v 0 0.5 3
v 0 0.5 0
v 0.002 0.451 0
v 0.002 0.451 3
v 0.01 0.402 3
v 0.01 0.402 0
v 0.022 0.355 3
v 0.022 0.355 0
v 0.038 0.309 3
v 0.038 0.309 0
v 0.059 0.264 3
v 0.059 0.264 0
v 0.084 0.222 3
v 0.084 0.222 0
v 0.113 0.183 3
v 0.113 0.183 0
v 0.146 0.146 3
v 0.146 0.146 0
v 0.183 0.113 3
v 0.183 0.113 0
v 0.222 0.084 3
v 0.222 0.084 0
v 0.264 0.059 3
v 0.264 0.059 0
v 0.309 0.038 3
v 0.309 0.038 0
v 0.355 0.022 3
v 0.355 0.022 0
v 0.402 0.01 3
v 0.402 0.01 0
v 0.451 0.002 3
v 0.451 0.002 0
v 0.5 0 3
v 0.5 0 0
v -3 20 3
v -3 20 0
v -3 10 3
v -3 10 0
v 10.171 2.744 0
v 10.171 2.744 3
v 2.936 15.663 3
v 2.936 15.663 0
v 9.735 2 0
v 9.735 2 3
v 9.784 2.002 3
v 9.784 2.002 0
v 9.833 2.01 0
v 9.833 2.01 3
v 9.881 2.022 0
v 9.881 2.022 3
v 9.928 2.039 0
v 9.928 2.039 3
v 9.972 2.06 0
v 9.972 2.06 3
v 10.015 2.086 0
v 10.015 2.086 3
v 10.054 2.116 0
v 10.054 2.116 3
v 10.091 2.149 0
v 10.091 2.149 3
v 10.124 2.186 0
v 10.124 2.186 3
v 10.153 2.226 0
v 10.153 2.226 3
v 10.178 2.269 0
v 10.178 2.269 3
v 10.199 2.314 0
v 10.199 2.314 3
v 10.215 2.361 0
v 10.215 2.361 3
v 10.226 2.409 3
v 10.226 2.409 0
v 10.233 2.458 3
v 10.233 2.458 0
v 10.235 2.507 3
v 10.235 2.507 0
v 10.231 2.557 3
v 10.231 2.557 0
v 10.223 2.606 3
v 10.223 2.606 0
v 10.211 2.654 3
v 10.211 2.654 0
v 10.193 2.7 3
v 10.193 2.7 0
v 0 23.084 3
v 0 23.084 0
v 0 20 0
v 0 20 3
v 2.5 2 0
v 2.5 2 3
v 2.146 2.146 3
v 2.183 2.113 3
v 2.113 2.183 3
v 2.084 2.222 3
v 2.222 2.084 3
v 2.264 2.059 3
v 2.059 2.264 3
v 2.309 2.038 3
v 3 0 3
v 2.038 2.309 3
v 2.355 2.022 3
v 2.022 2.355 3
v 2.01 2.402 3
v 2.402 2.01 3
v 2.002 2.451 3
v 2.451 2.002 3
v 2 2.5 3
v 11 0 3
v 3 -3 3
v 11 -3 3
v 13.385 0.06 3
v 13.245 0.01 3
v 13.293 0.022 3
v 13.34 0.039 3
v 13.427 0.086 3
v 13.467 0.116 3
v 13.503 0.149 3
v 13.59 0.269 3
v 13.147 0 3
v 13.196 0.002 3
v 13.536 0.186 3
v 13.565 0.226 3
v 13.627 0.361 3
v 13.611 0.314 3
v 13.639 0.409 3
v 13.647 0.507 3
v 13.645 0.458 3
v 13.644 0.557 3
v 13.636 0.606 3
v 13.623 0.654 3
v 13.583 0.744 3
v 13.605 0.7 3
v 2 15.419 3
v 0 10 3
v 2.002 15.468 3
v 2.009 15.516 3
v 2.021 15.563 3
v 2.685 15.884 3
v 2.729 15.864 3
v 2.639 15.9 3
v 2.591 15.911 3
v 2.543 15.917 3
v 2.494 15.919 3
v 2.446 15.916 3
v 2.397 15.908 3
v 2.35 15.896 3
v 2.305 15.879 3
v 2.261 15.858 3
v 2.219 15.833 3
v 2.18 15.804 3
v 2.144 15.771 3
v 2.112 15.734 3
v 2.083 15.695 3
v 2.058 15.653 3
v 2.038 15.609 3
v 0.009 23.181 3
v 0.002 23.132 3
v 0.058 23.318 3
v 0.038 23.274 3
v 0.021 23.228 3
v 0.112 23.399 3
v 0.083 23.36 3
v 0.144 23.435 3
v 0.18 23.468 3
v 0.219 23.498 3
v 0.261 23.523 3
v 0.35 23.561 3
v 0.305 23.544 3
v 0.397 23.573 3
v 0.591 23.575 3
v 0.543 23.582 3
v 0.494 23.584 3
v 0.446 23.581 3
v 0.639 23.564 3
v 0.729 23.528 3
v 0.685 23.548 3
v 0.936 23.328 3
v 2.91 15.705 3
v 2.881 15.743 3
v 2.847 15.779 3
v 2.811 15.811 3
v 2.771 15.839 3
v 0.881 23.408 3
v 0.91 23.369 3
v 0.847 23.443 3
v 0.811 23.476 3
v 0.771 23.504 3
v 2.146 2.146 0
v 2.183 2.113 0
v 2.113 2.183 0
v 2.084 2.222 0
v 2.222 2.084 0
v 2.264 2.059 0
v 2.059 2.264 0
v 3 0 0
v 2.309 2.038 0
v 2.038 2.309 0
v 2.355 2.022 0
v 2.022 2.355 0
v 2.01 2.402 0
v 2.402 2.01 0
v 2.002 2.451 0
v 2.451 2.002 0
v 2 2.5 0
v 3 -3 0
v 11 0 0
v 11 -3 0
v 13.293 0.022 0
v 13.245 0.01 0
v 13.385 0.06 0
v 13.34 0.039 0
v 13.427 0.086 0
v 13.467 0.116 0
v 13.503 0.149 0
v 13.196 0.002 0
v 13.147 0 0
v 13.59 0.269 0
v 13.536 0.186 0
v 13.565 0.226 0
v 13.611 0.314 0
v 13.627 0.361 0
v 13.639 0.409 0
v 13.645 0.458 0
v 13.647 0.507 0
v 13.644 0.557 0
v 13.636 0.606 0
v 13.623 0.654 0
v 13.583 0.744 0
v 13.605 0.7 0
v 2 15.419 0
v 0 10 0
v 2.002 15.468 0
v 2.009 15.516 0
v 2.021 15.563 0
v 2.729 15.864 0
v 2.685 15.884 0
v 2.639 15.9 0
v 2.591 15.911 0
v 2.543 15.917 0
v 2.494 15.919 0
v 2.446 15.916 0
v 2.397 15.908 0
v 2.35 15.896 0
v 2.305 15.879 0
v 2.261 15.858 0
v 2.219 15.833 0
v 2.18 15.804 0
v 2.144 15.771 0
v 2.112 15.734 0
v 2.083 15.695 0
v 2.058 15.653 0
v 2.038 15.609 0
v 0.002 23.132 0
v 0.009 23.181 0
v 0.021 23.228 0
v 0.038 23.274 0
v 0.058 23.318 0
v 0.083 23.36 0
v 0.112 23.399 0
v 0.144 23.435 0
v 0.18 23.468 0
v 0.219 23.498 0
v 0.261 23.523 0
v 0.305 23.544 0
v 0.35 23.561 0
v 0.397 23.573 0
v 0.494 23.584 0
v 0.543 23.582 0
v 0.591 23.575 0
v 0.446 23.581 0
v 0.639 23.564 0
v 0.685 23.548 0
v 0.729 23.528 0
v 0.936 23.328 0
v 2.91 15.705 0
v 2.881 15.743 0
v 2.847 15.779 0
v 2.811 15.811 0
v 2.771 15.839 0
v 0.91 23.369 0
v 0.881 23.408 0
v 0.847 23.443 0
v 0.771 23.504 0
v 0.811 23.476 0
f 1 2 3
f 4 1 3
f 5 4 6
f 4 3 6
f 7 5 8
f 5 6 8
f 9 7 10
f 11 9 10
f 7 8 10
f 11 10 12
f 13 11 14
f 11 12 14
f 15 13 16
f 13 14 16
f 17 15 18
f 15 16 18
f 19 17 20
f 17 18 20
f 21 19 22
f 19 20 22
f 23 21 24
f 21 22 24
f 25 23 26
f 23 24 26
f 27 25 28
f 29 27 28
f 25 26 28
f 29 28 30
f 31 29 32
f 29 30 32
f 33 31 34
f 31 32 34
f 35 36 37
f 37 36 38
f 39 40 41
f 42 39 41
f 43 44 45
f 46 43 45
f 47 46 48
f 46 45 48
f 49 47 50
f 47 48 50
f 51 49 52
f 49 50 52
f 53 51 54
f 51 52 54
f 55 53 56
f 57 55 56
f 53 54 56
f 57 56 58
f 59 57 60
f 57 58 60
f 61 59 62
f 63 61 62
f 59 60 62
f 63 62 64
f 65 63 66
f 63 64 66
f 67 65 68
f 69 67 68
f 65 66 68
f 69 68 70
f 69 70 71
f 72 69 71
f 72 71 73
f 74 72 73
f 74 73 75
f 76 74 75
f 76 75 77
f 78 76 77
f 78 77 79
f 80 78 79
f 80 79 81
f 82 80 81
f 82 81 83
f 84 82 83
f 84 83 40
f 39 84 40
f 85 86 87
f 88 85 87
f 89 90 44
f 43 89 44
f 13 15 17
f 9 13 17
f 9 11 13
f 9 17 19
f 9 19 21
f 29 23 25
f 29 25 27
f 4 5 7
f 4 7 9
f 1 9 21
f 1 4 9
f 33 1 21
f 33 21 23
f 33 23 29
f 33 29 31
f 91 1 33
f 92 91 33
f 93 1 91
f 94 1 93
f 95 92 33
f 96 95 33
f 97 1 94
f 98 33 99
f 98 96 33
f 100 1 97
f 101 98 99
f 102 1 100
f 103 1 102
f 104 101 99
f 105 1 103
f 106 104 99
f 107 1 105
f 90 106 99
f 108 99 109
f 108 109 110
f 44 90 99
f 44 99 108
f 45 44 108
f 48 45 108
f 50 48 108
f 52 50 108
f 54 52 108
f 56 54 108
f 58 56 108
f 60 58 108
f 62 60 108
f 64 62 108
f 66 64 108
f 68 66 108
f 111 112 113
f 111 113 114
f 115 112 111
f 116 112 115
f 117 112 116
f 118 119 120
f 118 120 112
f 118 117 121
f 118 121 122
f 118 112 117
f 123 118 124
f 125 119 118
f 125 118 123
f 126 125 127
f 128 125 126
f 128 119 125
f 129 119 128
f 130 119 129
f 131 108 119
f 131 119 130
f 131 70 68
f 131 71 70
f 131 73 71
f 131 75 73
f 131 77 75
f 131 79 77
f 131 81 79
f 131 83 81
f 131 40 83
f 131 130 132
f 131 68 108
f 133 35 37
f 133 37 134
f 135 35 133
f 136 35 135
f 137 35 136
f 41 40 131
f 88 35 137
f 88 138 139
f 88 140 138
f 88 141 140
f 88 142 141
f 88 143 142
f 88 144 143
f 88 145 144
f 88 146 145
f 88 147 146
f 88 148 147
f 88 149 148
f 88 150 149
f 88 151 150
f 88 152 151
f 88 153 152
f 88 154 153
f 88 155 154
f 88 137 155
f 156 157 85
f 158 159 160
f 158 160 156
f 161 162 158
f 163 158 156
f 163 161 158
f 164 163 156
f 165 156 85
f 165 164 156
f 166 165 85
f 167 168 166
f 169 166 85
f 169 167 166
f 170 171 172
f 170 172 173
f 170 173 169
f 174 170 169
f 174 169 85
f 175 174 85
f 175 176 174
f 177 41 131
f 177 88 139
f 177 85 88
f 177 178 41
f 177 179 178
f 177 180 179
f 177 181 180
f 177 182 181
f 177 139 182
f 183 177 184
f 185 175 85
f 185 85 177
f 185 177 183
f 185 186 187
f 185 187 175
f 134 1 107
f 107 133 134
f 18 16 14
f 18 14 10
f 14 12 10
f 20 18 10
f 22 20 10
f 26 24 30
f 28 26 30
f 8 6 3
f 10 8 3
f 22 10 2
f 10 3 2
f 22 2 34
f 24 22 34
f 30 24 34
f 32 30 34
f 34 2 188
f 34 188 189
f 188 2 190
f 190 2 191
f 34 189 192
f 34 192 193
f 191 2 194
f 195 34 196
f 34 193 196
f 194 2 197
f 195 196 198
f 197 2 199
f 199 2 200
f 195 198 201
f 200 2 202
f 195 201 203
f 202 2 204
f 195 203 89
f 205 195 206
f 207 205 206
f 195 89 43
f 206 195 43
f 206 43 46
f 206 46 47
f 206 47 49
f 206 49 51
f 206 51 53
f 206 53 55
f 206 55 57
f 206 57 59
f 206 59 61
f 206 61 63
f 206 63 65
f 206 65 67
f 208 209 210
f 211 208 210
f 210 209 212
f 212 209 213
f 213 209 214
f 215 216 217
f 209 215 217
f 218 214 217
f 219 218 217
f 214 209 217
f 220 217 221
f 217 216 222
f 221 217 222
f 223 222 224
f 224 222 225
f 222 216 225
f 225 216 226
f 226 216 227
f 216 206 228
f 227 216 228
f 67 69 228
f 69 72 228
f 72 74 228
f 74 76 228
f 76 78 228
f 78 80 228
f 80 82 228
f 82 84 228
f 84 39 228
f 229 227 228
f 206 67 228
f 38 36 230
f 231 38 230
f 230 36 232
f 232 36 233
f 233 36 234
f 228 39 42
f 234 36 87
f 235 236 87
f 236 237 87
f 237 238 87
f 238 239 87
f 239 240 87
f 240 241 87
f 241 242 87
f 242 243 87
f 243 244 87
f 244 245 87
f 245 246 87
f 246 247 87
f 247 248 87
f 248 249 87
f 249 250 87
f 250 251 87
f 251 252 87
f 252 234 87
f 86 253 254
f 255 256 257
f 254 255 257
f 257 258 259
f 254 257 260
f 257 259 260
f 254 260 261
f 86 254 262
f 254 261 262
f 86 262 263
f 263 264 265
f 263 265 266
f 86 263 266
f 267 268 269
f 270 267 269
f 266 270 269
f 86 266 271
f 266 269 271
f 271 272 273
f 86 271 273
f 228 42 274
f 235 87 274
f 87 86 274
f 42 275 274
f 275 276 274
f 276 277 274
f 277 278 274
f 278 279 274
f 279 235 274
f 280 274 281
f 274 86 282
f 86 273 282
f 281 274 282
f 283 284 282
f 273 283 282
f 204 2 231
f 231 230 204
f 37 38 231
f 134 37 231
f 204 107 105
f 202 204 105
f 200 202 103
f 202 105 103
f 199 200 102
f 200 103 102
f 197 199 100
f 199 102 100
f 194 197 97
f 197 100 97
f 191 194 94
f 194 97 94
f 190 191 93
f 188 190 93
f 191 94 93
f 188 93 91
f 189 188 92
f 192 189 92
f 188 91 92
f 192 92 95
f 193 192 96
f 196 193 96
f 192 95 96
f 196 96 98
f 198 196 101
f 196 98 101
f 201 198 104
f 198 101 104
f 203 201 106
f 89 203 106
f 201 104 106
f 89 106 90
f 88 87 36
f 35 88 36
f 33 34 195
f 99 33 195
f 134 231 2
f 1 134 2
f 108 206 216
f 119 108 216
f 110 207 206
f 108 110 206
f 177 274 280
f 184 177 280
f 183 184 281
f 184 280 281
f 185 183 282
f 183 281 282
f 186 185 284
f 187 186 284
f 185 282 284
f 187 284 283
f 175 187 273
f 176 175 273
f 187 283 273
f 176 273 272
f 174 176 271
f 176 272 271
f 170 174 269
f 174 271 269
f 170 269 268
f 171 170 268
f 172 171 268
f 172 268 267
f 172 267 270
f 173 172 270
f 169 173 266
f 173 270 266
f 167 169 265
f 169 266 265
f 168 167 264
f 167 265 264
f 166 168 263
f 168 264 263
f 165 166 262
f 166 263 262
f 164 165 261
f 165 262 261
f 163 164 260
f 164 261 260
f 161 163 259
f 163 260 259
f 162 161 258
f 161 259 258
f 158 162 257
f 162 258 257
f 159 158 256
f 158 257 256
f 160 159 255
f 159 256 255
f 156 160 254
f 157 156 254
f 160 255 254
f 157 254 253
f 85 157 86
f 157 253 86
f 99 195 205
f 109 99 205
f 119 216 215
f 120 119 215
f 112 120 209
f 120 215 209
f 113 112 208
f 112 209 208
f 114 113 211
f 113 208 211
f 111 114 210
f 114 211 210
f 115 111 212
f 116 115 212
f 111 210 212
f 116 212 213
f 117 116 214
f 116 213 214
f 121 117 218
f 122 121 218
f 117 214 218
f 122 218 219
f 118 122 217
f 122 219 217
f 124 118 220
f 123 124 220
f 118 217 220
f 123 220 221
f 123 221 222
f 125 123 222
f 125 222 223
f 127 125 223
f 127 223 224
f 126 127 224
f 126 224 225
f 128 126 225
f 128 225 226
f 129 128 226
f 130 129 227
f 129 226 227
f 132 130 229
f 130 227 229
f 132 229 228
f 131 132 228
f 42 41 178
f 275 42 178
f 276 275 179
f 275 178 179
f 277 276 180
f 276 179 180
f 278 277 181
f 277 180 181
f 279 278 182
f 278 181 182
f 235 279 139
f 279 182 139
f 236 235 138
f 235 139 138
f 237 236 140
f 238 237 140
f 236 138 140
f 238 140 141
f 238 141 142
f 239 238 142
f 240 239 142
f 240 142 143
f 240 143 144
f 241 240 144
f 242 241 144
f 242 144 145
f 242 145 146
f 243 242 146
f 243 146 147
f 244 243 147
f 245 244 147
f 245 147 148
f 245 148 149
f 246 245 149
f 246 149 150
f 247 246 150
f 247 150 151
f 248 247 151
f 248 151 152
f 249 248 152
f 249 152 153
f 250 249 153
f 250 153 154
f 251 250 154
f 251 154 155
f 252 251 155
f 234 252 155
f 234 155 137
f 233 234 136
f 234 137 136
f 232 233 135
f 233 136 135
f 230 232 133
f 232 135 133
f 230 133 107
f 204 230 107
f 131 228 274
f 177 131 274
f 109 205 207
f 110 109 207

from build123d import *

# Parameters (mm, degrees)
EXTRUDE_2_DEPTH     = 3
CUT_EXTRUDE_1_DEPTH = 28.412321808


with BuildPart() as part:
    # 草图1 → 凸台-拉伸2 (new body)
    with BuildSketch(Plane.XY):
        with BuildLine():
            Line((0.5, 0), (3, 0))
            Line((3, 0), (3, -3))
            Line((3, -3), (11, -3))
            Line((11, -3), (11, 0))
            Line((11, 0), (13.146938049, 0))
            ThreePointArc((13.146938049, 0), (13.578302652, 0.247166895), (13.583191057, 0.744301684))
            Line((13.583191057, 0.744301684), (0.936253008, 23.328119629))
            ThreePointArc((0.936253008, 23.328119629), (0.373759167, 23.567618783), (0, 23.083817944))
            Line((0, 23.083817944), (0, 20))
            Line((0, 20), (-3, 20))
            Line((-3, 20), (-3, 10))
            Line((-3, 10), (0, 10))
            Line((0, 10), (0, 0.5))
            ThreePointArc((0, 0.5), (0.146446609, 0.146446609), (0.5, 0))
        make_face()
    extrude(amount=EXTRUDE_2_DEPTH)

    # 草图2 → 切除-拉伸1 (cut, through all)
    with BuildSketch(Plane.XY.offset(3)):
        with BuildLine():
            Line((2, 15.419089721), (2, 2.5))
            ThreePointArc((2, 2.5), (2.146446609, 2.146446609), (2.5, 2))
            Line((2.5, 2), (9.734690244, 2))
            ThreePointArc((9.734690244, 2), (10.166054847, 2.247166895), (10.170943252, 2.744301684))
            Line((10.170943252, 2.744301684), (2.936253008, 15.663391405))
            ThreePointArc((2.936253008, 15.663391405), (2.373759167, 15.90289056), (2, 15.419089721))
        make_face()
    extrude(amount=-CUT_EXTRUDE_1_DEPTH, mode=Mode.SUBTRACT)


solid = part.part
